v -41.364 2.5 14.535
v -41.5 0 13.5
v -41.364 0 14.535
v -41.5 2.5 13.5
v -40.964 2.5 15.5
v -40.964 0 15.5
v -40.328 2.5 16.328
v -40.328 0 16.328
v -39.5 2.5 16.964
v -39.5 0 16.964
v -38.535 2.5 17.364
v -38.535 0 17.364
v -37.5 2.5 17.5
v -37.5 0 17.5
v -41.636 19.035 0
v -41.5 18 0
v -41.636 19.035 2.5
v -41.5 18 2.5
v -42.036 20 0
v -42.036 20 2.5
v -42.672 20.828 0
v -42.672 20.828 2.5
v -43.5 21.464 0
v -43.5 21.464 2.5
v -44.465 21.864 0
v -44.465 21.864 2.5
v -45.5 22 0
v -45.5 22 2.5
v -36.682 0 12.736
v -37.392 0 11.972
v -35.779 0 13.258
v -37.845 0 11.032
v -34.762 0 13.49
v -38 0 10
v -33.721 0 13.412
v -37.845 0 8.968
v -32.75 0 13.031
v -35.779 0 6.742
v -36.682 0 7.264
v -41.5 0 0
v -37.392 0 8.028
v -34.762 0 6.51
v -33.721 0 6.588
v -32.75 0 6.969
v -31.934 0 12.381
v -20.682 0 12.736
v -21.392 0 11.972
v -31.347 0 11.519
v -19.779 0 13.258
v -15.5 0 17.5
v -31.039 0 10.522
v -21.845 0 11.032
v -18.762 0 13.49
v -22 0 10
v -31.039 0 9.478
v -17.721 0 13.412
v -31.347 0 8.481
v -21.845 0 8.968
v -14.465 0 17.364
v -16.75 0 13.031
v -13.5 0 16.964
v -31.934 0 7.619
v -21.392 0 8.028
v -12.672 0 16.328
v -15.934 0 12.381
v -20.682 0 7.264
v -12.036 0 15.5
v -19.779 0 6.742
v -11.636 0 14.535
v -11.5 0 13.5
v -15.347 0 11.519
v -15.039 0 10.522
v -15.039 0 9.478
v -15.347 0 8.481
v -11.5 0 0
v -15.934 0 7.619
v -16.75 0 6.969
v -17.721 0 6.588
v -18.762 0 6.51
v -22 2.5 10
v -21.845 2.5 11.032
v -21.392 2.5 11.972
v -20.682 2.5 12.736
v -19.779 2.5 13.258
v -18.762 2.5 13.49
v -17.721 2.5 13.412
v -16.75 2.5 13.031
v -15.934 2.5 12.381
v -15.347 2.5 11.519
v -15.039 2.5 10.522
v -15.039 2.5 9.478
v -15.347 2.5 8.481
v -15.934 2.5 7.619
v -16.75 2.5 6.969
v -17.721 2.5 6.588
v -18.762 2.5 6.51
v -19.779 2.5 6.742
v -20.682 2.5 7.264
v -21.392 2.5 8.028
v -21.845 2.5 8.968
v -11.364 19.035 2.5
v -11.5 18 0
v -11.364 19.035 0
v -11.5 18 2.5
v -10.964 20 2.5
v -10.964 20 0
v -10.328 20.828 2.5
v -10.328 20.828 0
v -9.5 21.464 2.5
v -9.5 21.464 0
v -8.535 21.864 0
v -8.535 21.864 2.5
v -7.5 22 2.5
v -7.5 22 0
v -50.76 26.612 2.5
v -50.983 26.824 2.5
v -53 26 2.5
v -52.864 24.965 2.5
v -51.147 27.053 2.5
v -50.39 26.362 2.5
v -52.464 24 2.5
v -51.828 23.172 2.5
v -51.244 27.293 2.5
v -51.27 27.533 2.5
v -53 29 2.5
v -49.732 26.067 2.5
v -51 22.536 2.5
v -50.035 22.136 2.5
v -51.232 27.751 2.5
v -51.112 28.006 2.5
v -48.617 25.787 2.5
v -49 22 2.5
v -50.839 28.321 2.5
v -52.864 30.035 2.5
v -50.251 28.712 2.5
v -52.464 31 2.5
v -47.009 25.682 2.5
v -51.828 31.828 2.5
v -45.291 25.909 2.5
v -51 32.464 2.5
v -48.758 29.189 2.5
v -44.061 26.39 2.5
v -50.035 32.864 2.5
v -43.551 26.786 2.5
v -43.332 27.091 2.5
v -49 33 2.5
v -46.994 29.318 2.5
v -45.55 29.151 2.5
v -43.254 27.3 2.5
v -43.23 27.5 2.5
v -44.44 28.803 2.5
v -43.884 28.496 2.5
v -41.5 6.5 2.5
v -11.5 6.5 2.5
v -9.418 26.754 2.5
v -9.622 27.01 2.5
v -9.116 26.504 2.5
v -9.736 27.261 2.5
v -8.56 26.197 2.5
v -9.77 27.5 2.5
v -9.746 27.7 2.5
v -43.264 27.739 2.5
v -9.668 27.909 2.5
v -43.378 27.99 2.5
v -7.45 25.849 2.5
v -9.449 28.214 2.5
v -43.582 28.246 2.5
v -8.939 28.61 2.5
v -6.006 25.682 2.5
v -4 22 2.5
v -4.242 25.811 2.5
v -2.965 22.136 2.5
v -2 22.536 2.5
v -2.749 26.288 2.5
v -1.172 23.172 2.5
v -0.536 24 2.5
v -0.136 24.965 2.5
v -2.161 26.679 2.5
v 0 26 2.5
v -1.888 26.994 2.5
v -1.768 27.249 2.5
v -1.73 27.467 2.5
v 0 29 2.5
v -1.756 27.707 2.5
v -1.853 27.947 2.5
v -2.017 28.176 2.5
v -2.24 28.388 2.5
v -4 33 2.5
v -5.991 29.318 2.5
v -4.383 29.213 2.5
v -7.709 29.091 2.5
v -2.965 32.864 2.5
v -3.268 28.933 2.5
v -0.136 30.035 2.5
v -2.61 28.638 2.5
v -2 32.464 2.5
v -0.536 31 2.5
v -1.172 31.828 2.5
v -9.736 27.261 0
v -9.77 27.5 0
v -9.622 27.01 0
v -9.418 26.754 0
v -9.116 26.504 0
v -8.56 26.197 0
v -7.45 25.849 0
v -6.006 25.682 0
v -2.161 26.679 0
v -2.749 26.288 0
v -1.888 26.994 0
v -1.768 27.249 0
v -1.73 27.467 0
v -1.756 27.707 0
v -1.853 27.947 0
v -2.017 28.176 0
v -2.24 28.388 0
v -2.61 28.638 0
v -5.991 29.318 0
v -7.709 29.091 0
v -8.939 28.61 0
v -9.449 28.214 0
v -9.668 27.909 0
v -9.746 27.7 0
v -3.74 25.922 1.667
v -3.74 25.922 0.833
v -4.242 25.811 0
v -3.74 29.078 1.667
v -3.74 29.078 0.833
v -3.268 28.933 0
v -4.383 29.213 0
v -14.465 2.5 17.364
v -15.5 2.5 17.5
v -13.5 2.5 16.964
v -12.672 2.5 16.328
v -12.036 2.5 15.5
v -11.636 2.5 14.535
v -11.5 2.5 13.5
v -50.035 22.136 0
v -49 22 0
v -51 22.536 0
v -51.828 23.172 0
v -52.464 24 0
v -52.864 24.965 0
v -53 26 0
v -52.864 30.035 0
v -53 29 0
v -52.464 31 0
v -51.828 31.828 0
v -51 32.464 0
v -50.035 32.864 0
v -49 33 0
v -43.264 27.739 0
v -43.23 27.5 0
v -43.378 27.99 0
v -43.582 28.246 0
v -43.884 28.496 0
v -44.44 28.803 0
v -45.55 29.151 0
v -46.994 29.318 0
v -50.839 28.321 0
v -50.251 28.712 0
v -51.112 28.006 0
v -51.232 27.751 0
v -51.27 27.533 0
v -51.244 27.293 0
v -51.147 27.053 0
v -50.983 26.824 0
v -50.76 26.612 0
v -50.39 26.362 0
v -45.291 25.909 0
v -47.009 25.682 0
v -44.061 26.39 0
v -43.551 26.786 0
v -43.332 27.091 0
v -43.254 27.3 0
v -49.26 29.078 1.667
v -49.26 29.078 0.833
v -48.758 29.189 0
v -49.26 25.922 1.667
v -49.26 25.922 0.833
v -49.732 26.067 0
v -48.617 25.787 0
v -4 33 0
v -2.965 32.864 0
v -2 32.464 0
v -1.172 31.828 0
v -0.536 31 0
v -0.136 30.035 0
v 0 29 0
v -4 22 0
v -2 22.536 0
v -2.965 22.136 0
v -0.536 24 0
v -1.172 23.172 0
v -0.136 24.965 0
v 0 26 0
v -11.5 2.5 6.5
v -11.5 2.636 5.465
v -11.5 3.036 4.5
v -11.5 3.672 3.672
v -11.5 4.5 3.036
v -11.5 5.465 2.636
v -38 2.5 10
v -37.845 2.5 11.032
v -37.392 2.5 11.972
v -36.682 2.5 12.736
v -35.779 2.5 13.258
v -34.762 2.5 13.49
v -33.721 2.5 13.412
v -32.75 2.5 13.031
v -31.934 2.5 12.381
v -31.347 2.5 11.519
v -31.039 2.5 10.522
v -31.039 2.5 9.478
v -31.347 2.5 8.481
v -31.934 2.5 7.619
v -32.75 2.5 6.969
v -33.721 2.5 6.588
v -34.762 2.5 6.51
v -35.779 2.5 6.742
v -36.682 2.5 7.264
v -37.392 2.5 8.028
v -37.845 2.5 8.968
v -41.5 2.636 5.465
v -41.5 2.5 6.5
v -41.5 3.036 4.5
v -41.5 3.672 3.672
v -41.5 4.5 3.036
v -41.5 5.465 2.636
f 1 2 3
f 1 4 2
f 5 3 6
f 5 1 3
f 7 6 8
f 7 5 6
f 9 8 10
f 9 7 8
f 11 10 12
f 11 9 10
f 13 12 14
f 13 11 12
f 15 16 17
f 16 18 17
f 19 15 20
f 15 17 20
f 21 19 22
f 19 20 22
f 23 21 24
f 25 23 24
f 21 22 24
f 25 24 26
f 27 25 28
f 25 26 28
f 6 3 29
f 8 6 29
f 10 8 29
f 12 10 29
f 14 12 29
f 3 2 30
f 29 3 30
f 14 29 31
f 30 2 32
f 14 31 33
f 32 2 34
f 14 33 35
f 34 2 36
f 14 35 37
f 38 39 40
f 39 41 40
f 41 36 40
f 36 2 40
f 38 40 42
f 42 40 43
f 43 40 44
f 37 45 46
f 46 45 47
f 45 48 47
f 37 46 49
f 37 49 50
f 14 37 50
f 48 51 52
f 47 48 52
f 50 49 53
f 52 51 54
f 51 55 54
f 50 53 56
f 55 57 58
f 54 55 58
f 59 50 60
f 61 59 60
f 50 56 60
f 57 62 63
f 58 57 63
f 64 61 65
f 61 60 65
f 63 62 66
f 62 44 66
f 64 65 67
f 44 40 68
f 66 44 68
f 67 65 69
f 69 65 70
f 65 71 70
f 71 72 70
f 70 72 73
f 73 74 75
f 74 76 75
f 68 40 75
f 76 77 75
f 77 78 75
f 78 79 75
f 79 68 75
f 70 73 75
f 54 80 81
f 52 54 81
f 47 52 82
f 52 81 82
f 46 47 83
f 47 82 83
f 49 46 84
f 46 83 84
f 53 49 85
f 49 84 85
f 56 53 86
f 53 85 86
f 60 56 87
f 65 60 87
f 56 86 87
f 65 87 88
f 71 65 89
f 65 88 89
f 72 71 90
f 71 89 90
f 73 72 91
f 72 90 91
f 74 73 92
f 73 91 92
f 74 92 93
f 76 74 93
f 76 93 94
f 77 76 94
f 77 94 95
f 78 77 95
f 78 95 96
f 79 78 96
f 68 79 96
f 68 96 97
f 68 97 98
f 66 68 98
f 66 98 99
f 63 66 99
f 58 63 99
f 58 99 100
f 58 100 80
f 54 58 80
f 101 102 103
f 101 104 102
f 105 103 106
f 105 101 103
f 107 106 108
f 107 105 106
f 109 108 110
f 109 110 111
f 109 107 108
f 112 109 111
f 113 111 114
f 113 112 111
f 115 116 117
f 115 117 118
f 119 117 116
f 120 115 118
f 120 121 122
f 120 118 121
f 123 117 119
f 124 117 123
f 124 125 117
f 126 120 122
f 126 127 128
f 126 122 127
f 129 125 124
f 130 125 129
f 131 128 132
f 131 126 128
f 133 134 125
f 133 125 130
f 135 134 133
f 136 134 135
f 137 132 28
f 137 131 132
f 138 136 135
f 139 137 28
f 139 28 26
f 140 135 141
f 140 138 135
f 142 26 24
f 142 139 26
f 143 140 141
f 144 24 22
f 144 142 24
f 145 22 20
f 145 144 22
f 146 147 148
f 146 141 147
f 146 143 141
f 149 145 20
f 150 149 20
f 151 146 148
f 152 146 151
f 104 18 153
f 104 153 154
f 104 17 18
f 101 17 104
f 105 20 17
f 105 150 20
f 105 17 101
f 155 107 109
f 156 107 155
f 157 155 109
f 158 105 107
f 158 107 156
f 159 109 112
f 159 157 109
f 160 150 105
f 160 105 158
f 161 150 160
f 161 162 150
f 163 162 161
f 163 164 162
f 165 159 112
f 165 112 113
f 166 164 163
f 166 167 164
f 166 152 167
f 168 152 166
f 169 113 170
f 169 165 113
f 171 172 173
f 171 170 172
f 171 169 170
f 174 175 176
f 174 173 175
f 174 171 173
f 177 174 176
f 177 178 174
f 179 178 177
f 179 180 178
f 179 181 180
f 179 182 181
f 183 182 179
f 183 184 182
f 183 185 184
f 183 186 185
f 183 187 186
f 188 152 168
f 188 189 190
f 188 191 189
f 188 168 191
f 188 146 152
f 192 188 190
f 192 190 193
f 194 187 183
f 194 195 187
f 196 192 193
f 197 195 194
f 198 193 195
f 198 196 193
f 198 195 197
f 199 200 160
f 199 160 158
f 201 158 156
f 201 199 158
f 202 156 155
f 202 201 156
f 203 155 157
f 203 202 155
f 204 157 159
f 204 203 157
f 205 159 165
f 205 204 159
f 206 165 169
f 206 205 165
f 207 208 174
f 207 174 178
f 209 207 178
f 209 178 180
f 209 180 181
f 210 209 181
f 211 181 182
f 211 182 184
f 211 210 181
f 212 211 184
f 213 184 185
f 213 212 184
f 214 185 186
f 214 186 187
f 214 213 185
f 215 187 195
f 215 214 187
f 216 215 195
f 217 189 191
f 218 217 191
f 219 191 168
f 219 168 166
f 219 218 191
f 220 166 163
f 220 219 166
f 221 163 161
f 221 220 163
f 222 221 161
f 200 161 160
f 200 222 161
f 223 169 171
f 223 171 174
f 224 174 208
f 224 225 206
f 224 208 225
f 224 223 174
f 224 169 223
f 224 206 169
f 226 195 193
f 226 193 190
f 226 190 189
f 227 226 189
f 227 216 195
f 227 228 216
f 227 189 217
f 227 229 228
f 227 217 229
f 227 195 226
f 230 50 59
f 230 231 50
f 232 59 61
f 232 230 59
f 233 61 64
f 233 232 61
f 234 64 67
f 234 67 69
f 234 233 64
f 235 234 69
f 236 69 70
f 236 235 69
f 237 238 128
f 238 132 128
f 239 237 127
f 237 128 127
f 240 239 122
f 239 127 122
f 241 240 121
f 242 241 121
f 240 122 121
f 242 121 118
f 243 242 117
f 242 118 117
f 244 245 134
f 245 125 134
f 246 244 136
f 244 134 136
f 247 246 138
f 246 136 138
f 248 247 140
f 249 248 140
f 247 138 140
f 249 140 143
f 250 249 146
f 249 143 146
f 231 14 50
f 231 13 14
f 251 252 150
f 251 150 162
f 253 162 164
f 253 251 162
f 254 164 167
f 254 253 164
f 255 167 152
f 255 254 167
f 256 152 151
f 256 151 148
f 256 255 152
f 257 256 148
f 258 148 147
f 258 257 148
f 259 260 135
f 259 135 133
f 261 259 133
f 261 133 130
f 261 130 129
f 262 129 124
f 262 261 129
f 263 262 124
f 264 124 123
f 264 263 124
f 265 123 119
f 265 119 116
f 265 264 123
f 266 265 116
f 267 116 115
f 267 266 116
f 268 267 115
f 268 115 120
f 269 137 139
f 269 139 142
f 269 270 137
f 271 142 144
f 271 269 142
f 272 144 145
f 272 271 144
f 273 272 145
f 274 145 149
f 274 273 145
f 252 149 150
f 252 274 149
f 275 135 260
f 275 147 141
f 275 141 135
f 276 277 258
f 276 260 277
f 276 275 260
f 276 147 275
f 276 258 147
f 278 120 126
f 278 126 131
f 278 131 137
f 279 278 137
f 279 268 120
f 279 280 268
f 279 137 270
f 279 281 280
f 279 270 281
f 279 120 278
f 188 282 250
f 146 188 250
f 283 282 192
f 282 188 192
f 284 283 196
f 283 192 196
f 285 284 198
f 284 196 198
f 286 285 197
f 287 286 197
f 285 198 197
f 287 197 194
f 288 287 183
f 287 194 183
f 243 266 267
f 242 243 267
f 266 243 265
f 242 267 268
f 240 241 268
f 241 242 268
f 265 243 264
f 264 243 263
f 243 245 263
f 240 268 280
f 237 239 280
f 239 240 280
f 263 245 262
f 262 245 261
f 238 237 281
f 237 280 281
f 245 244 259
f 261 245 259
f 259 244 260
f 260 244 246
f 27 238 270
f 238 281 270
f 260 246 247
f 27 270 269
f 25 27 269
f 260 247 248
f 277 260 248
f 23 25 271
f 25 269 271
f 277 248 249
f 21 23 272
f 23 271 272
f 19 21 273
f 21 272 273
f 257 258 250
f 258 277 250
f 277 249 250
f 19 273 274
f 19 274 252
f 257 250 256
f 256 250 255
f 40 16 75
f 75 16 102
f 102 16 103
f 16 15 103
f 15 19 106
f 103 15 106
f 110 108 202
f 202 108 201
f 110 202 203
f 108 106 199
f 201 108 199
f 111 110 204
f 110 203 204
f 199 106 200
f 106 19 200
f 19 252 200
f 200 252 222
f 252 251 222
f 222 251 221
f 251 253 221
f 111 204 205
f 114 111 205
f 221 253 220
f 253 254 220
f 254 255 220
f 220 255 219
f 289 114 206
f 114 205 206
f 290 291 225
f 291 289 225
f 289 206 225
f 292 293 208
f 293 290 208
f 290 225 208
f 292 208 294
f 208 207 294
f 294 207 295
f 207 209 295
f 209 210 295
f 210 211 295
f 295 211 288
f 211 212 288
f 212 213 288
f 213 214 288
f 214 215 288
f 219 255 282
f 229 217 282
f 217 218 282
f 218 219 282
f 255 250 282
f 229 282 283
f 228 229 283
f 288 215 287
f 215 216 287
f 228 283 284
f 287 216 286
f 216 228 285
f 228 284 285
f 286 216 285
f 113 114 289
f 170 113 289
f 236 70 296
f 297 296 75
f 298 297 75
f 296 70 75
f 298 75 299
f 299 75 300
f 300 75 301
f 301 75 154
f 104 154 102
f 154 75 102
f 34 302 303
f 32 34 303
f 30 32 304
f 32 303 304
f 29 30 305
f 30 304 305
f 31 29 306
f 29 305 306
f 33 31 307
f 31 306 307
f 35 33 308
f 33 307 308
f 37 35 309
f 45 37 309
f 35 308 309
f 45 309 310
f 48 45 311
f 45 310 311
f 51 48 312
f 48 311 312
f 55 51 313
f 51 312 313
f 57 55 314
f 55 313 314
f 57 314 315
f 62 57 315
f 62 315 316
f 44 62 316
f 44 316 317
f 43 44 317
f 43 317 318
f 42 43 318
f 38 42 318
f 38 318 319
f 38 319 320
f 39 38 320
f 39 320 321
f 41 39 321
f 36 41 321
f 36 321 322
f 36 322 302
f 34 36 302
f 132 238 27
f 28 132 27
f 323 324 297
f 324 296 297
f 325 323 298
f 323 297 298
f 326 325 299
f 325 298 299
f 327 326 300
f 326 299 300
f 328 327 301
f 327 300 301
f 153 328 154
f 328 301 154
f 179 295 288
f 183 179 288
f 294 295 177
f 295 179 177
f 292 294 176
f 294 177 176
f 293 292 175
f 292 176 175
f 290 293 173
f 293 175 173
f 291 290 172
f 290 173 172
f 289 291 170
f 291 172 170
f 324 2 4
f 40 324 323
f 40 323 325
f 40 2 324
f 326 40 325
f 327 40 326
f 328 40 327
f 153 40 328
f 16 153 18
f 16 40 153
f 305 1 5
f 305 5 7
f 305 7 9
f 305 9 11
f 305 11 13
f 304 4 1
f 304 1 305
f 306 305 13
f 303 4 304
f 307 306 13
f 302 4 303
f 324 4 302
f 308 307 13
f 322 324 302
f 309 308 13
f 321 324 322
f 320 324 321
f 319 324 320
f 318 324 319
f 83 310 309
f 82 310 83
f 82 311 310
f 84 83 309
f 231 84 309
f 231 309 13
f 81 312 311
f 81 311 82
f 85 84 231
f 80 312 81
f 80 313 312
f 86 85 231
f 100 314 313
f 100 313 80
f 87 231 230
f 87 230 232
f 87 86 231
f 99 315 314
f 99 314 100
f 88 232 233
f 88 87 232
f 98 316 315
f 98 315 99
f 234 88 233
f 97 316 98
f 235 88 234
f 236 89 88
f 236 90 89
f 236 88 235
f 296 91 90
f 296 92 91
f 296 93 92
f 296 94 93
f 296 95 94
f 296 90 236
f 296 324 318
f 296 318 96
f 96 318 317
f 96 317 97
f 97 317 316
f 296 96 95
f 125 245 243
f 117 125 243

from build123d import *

# Parameters (mm, degrees)
F1_DEPTH = 2.5
F2_W     = 30
F2_H     = 2.5
F3_DEPTH = 15
F4_R     = 3.5
F5_DEPTH = 2.501
F6_R     = 4


with BuildPart() as f1:
    # F0 (on Top) → F1 (new body)
    with BuildSketch(Plane.XY):
        Polygon((-41.5, 0), (-11.5, 0), (-11.5, 22), (0, 22), (0, 33), (-53, 33), (-53, 22), (-41.5, 22), align=None)
        with BuildLine():
            add(Edge.make_bspline(
                [(-43.229692, 27.5), (-43.229692, 30.655264), (-49.260154, 29.077632), (-55.290617, 27.5), (-49.260154, 25.922368), (-43.229692, 24.344736), (-43.229692, 27.5)],
                knots=[0, 0, 0, 2.094395, 2.094395, 4.18879, 4.18879, 6.283185, 6.283185, 6.283185], degree=2, weights=[1, 0.5, 1, 0.5, 1, 0.5, 1]))
        make_face(mode=Mode.SUBTRACT)
        with BuildLine():
            add(Edge.make_bspline(
                [(-9.770308, 27.5), (-9.770308, 24.344736), (-3.739846, 25.922368), (2.290617, 27.5), (-3.739846, 29.077632), (-9.770308, 30.655264), (-9.770308, 27.5)],
                knots=[0, 0, 0, 2.094395, 2.094395, 4.18879, 4.18879, 6.283185, 6.283185, 6.283185], degree=2, weights=[1, 0.5, 1, 0.5, 1, 0.5, 1]))
        make_face(mode=Mode.SUBTRACT)
    extrude(amount=F1_DEPTH)

    # F2 (on face) → F3 (join)
    with BuildSketch(Plane.XY.offset(2.5)):
        with Locations((-26.5, 1.25)):
            Rectangle(F2_W, F2_H)
    extrude(amount=F3_DEPTH)

    # F4 (on face) → F5 (cut, through all)
    with BuildSketch(Plane(origin=(0, 2.5, 0), x_dir=(-1, 0, 0), z_dir=(0, 1, 0))):
        with Locations((18.5, 10)):
            Circle(F4_R)
        with Locations((34.5, 10)):
            Circle(F4_R)
    extrude(amount=-F5_DEPTH, mode=Mode.SUBTRACT)

    # F6
    f6_edges = [f1.edges().sort_by_distance(p)[0] for p in [
        (0, 33, 1.25),
        (-53, 33, 1.25),
        (-53, 22, 1.25),
        (-41.5, 22, 1.25),
        (-11.5, 22, 1.25),
        (0, 22, 1.25),
        (-26.5, 2.5, 2.5),
        (-11.5, 1.25, 17.5),
        (-41.5, 1.25, 17.5),
    ]]
    fillet(f6_edges, radius=F6_R)


solid = f1.part
